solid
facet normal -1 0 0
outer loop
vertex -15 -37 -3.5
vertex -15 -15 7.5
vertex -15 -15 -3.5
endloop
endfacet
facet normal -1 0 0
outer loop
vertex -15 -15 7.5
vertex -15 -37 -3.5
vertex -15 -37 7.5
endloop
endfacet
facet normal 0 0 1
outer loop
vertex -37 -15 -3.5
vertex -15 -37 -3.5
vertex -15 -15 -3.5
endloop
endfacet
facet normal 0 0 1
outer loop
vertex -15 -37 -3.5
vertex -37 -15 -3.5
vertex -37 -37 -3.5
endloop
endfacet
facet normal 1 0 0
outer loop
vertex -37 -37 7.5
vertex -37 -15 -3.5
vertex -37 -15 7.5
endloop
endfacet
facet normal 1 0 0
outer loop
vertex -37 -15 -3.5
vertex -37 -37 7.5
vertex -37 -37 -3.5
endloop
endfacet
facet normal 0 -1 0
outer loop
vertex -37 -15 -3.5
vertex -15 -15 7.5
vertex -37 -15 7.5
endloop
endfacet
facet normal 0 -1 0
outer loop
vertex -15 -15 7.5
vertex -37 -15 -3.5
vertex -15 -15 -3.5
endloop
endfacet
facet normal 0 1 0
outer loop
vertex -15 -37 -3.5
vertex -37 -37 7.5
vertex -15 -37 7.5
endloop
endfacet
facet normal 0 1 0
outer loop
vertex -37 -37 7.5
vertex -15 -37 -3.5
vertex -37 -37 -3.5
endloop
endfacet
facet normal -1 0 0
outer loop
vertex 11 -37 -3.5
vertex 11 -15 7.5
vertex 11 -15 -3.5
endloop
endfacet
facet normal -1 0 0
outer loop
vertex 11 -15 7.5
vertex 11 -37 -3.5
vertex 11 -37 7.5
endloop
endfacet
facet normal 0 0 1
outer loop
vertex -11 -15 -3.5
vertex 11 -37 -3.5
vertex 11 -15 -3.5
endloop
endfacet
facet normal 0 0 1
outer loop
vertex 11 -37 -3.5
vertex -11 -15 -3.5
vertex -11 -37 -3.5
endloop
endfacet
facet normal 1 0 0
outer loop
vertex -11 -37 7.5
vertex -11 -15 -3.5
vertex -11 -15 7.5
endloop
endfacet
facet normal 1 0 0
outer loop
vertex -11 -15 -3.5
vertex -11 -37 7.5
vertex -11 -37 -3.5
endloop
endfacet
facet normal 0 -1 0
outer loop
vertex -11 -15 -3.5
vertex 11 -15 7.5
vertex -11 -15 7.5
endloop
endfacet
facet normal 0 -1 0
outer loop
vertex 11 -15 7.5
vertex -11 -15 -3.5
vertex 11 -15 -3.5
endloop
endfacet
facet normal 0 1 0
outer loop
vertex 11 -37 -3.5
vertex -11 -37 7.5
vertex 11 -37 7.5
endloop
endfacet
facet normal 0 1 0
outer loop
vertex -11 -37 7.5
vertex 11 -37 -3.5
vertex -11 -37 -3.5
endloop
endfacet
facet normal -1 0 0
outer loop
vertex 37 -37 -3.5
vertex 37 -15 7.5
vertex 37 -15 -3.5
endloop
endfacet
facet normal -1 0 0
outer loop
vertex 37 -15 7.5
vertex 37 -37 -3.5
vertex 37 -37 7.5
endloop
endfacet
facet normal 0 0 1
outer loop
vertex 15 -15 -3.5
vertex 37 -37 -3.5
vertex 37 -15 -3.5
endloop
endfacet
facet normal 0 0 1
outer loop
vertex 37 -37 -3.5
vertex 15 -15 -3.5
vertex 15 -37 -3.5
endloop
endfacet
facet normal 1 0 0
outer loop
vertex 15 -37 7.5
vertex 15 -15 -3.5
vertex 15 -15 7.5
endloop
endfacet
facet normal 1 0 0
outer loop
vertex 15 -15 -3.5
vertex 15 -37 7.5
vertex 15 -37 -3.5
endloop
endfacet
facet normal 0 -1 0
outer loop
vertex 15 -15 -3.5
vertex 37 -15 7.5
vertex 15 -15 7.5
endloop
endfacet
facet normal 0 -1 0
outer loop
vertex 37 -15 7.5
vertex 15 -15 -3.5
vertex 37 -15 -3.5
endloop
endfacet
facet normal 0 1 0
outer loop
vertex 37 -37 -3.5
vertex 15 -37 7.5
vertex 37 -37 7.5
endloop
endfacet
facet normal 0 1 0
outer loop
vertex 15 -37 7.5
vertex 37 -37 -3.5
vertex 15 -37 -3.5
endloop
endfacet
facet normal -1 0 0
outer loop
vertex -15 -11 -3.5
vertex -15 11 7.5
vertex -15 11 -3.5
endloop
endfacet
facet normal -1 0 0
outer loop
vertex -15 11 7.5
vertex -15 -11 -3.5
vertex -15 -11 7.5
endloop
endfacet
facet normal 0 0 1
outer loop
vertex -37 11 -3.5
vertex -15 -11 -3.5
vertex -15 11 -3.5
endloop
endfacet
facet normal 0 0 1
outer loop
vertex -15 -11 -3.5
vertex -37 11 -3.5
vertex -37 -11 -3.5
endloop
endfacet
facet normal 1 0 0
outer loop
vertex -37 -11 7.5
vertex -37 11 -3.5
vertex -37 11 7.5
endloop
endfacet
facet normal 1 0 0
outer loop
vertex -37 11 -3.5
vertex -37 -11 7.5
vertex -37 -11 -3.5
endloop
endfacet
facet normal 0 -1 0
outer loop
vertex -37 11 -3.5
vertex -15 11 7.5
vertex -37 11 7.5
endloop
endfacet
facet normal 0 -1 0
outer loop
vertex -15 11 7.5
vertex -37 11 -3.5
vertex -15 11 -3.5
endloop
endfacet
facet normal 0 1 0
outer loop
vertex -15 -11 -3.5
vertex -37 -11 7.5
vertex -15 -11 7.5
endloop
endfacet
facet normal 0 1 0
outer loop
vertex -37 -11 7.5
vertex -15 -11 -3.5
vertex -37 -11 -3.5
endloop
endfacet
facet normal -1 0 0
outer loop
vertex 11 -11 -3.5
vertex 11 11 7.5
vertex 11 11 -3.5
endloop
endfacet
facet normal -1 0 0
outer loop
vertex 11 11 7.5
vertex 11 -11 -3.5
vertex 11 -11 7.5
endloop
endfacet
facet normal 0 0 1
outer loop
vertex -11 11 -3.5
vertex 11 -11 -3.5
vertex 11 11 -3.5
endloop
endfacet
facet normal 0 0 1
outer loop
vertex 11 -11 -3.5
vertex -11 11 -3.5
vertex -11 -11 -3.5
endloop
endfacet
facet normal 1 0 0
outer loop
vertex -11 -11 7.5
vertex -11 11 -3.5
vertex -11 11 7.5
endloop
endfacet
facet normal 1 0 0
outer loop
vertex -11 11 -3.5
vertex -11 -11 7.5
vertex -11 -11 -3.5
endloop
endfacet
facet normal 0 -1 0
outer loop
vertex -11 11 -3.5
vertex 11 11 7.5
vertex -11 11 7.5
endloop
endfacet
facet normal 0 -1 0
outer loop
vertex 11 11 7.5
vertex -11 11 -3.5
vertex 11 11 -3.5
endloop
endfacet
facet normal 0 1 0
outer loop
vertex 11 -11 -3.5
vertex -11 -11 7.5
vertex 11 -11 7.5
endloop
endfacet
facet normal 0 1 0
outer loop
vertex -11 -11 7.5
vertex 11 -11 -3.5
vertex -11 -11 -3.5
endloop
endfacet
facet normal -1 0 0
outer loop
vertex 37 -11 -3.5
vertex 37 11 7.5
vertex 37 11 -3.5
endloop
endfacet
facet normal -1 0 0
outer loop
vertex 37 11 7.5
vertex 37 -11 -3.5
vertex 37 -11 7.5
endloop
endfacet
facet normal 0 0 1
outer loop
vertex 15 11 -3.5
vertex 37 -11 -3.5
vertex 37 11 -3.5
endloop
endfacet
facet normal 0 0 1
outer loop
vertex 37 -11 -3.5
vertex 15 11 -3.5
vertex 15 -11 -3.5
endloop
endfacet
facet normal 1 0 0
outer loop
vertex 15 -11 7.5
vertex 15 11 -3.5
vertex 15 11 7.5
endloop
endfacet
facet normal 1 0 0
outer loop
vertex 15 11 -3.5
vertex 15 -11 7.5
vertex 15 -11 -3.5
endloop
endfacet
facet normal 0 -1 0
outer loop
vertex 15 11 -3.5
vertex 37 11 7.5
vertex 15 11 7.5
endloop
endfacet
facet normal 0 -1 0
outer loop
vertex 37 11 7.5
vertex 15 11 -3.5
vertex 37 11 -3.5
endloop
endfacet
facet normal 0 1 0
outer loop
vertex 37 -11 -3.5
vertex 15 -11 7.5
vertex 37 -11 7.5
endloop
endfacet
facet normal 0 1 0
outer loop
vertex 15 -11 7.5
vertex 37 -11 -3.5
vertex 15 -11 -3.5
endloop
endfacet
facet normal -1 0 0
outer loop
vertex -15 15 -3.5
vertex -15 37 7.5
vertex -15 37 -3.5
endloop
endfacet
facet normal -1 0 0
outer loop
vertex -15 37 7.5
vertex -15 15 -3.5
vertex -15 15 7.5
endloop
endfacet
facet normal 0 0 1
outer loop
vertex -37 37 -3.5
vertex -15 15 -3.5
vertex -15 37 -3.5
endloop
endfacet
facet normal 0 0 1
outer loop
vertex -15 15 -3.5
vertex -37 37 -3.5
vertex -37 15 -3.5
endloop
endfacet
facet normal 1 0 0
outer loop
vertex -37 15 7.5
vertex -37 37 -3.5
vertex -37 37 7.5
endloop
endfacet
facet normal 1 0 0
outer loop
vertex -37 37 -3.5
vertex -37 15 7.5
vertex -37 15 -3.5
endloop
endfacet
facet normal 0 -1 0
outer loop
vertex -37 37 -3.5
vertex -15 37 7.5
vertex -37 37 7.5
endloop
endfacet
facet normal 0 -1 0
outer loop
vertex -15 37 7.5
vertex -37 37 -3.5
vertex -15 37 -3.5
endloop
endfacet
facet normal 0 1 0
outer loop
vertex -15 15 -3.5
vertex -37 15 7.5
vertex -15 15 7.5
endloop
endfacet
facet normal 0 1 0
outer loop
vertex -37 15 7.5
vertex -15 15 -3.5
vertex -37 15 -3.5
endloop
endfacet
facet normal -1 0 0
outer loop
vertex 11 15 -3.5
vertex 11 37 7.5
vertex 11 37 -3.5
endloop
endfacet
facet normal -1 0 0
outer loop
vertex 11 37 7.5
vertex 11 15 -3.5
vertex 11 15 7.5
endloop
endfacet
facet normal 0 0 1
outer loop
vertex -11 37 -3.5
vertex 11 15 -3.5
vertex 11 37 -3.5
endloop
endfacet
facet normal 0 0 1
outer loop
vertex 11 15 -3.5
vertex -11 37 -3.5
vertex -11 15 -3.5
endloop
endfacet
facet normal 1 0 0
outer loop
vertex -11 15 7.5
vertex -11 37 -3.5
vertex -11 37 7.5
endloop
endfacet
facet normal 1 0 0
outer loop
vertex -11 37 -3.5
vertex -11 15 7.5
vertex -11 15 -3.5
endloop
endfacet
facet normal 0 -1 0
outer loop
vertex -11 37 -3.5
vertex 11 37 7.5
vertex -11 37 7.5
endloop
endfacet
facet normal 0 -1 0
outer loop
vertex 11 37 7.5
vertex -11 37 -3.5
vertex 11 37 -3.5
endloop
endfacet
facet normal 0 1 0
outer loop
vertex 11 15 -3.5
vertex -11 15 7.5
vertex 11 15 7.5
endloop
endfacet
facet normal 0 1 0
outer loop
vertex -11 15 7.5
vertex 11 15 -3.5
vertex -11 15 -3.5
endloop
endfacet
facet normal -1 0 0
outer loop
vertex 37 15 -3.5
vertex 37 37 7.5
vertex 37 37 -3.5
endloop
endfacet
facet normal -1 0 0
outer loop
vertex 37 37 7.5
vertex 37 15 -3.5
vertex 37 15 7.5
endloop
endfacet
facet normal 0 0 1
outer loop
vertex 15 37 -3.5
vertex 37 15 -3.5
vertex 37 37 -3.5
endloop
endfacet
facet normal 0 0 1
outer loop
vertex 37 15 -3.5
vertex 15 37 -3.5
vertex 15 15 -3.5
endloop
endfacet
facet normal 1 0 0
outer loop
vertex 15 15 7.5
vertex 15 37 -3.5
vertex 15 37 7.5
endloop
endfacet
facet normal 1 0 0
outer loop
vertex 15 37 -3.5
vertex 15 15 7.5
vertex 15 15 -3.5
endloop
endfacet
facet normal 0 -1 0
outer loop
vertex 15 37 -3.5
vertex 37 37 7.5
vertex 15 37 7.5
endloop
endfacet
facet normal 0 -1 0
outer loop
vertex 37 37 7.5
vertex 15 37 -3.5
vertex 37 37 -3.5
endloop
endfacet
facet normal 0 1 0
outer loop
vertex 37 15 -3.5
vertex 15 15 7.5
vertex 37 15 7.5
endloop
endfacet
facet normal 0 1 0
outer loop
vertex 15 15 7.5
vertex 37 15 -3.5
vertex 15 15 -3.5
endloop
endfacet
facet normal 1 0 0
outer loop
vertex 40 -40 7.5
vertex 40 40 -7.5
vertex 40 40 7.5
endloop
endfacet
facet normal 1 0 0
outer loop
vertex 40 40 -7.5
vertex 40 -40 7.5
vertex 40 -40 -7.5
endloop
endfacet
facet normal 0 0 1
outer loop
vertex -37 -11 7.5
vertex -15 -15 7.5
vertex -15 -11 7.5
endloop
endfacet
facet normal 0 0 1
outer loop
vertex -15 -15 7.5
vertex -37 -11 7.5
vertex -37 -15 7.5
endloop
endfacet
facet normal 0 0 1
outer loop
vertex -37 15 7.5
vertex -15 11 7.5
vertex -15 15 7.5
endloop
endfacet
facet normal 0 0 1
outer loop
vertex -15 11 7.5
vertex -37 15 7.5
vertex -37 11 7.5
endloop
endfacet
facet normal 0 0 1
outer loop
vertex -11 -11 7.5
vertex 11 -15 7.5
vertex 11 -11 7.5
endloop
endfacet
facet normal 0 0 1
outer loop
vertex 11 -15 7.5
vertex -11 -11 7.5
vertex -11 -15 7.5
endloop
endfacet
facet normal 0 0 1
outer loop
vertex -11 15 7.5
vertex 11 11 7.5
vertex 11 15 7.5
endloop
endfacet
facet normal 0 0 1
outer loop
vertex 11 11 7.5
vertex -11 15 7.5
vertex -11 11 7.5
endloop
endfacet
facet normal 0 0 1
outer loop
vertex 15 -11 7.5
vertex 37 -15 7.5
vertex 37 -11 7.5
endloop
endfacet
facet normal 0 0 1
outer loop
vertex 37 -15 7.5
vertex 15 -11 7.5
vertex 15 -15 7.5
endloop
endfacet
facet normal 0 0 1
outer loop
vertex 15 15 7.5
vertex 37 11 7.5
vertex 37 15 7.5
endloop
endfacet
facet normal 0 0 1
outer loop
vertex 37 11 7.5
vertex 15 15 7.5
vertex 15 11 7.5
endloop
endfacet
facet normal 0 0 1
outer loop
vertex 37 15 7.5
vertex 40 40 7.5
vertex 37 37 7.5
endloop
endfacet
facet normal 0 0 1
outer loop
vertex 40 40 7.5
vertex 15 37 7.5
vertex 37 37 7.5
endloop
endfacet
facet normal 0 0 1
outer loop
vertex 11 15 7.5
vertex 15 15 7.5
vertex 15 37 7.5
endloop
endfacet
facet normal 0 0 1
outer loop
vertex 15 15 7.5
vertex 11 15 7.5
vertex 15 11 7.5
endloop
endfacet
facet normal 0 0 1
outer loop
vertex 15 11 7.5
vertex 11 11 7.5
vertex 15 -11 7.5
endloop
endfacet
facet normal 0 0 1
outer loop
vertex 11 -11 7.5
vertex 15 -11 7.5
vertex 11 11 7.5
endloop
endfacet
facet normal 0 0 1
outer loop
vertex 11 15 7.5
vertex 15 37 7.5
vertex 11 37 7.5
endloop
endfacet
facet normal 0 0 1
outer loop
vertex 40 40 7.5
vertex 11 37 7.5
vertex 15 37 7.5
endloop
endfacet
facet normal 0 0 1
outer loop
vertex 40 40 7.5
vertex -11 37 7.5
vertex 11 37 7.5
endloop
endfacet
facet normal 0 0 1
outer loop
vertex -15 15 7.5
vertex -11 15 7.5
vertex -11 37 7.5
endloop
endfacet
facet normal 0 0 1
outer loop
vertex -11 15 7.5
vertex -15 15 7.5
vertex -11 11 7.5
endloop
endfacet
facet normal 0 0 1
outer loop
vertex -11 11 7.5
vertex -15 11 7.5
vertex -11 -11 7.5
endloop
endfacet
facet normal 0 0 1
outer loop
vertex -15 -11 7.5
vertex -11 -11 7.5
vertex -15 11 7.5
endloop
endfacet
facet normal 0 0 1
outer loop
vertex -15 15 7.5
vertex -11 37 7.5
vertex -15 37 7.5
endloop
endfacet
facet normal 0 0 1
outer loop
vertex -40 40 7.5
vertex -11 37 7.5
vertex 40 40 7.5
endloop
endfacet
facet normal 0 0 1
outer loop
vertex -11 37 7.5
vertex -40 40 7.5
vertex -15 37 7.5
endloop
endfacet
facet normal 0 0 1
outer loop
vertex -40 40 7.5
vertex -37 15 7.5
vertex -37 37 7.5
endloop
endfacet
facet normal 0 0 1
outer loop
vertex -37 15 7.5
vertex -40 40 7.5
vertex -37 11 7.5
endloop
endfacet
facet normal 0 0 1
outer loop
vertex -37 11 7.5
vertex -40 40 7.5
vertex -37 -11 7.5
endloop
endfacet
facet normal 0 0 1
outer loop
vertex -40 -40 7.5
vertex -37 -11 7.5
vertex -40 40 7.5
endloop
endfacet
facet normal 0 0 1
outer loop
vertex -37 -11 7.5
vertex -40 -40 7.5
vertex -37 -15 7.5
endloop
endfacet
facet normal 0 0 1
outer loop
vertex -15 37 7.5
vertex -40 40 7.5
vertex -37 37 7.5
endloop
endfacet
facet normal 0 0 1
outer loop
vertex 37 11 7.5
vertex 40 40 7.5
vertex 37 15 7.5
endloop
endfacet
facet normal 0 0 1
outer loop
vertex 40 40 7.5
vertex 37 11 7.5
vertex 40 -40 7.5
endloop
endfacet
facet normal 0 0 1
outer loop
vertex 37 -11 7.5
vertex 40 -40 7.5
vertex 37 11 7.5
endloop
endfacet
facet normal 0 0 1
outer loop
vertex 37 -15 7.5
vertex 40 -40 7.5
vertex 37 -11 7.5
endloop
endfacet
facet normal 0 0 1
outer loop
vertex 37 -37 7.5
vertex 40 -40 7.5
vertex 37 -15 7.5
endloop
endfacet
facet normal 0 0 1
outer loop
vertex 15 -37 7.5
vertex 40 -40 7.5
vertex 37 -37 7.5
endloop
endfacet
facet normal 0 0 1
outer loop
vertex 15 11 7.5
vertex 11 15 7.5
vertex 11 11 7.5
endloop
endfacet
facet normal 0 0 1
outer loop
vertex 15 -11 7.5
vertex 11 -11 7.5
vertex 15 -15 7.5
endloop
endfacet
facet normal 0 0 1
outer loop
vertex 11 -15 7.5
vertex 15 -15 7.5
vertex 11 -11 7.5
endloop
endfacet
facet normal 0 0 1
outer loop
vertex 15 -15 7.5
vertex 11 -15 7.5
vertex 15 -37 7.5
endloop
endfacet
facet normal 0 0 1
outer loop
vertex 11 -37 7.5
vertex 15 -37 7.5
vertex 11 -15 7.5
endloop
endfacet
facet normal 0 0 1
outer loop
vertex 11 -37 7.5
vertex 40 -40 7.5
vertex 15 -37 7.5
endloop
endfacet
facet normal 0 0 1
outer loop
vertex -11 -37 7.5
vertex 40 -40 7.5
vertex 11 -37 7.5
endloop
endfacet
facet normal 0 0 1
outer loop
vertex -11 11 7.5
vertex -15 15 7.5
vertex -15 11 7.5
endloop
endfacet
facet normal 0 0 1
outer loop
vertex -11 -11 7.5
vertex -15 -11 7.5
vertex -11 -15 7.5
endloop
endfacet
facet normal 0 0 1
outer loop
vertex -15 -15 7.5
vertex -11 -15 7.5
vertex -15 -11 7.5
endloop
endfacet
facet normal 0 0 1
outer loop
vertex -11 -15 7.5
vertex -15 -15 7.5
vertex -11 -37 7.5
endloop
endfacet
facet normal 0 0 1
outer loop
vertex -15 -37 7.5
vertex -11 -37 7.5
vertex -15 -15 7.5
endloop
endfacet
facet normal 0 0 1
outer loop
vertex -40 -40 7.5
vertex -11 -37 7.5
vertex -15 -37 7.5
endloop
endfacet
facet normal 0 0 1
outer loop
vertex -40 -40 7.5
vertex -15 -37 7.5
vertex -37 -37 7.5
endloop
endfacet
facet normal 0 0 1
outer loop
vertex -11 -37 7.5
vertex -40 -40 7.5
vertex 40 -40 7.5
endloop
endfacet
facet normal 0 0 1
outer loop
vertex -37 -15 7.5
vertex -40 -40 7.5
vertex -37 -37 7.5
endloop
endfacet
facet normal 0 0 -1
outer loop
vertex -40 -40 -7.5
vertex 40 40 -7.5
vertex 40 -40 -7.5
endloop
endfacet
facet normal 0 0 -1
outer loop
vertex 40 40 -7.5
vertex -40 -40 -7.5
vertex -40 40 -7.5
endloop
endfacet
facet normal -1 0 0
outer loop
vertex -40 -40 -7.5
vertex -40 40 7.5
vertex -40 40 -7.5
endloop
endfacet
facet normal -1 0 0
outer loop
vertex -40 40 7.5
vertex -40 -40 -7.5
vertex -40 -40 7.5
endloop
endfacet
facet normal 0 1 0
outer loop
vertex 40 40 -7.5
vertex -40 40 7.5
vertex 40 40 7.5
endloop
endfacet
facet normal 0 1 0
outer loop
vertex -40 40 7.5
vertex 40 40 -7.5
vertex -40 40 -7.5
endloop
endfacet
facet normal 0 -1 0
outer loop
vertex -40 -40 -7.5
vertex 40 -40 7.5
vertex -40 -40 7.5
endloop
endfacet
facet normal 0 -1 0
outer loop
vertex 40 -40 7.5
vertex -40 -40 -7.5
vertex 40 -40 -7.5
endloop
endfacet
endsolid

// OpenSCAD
$fn = 32;

// ----------------------------------------------------------------------
// Pocket plate 80 x 80 x 15
// 3 x 3 pockets 22 mm square, 11 mm deep
// ----------------------------------------------------------------------

// --- parameters (mm) ---
thickness = 15;  // plate thickness
floor_t = 4;     // material left under each pocket
pocket = 22;     // pocket side length
pitch_x = 26;    // pocket pitch along X
pitch_y = 26;    // pocket pitch along Y
cols = 3;        // pockets per row
rows = 3;        // rows of pockets

// --- derived feature positions (mm) ---
depth = thickness - floor_t;        // = 11   pocket depth, down to the floor
span_x = (cols - 1) * pitch_x;      // = 52   distance between outer pockets
span_y = (rows - 1) * pitch_y;      // = 52   distance between outer pocket rows
origin_x = -span_x / 2;             // = -26   X of the first pocket
origin_y = -span_y / 2;             // = -26   Y of the first pocket
plate = [span_x + pocket + 6, span_y + pocket + 6, thickness];  // = [80, 80, 15]   overall size: pockets plus 3 mm of wall on each side
feature_centers = [
  [origin_x + 0 * pitch_x, origin_y + 0 * pitch_y],
  [origin_x + 1 * pitch_x, origin_y + 0 * pitch_y],
  [origin_x + 2 * pitch_x, origin_y + 0 * pitch_y],
  [origin_x + 0 * pitch_x, origin_y + 1 * pitch_y],
  [origin_x + 1 * pitch_x, origin_y + 1 * pitch_y],
  [origin_x + 2 * pitch_x, origin_y + 1 * pitch_y],
  [origin_x + 0 * pitch_x, origin_y + 2 * pitch_y],
  [origin_x + 1 * pitch_x, origin_y + 2 * pitch_y],
  [origin_x + 2 * pitch_x, origin_y + 2 * pitch_y]
];   // pocket centres, used verbatim by the cutter loop

// plate outline, then one pocket per centre in feature_centers
difference() {
  cube(plate, center = true);
  for (centre = feature_centers)
    translate([centre[0] - pocket / 2, centre[1] - pocket / 2, plate[2] / 2 - depth])
      cube([pocket, pocket, depth + 1]);  // centred on the declared pocket centre
}
